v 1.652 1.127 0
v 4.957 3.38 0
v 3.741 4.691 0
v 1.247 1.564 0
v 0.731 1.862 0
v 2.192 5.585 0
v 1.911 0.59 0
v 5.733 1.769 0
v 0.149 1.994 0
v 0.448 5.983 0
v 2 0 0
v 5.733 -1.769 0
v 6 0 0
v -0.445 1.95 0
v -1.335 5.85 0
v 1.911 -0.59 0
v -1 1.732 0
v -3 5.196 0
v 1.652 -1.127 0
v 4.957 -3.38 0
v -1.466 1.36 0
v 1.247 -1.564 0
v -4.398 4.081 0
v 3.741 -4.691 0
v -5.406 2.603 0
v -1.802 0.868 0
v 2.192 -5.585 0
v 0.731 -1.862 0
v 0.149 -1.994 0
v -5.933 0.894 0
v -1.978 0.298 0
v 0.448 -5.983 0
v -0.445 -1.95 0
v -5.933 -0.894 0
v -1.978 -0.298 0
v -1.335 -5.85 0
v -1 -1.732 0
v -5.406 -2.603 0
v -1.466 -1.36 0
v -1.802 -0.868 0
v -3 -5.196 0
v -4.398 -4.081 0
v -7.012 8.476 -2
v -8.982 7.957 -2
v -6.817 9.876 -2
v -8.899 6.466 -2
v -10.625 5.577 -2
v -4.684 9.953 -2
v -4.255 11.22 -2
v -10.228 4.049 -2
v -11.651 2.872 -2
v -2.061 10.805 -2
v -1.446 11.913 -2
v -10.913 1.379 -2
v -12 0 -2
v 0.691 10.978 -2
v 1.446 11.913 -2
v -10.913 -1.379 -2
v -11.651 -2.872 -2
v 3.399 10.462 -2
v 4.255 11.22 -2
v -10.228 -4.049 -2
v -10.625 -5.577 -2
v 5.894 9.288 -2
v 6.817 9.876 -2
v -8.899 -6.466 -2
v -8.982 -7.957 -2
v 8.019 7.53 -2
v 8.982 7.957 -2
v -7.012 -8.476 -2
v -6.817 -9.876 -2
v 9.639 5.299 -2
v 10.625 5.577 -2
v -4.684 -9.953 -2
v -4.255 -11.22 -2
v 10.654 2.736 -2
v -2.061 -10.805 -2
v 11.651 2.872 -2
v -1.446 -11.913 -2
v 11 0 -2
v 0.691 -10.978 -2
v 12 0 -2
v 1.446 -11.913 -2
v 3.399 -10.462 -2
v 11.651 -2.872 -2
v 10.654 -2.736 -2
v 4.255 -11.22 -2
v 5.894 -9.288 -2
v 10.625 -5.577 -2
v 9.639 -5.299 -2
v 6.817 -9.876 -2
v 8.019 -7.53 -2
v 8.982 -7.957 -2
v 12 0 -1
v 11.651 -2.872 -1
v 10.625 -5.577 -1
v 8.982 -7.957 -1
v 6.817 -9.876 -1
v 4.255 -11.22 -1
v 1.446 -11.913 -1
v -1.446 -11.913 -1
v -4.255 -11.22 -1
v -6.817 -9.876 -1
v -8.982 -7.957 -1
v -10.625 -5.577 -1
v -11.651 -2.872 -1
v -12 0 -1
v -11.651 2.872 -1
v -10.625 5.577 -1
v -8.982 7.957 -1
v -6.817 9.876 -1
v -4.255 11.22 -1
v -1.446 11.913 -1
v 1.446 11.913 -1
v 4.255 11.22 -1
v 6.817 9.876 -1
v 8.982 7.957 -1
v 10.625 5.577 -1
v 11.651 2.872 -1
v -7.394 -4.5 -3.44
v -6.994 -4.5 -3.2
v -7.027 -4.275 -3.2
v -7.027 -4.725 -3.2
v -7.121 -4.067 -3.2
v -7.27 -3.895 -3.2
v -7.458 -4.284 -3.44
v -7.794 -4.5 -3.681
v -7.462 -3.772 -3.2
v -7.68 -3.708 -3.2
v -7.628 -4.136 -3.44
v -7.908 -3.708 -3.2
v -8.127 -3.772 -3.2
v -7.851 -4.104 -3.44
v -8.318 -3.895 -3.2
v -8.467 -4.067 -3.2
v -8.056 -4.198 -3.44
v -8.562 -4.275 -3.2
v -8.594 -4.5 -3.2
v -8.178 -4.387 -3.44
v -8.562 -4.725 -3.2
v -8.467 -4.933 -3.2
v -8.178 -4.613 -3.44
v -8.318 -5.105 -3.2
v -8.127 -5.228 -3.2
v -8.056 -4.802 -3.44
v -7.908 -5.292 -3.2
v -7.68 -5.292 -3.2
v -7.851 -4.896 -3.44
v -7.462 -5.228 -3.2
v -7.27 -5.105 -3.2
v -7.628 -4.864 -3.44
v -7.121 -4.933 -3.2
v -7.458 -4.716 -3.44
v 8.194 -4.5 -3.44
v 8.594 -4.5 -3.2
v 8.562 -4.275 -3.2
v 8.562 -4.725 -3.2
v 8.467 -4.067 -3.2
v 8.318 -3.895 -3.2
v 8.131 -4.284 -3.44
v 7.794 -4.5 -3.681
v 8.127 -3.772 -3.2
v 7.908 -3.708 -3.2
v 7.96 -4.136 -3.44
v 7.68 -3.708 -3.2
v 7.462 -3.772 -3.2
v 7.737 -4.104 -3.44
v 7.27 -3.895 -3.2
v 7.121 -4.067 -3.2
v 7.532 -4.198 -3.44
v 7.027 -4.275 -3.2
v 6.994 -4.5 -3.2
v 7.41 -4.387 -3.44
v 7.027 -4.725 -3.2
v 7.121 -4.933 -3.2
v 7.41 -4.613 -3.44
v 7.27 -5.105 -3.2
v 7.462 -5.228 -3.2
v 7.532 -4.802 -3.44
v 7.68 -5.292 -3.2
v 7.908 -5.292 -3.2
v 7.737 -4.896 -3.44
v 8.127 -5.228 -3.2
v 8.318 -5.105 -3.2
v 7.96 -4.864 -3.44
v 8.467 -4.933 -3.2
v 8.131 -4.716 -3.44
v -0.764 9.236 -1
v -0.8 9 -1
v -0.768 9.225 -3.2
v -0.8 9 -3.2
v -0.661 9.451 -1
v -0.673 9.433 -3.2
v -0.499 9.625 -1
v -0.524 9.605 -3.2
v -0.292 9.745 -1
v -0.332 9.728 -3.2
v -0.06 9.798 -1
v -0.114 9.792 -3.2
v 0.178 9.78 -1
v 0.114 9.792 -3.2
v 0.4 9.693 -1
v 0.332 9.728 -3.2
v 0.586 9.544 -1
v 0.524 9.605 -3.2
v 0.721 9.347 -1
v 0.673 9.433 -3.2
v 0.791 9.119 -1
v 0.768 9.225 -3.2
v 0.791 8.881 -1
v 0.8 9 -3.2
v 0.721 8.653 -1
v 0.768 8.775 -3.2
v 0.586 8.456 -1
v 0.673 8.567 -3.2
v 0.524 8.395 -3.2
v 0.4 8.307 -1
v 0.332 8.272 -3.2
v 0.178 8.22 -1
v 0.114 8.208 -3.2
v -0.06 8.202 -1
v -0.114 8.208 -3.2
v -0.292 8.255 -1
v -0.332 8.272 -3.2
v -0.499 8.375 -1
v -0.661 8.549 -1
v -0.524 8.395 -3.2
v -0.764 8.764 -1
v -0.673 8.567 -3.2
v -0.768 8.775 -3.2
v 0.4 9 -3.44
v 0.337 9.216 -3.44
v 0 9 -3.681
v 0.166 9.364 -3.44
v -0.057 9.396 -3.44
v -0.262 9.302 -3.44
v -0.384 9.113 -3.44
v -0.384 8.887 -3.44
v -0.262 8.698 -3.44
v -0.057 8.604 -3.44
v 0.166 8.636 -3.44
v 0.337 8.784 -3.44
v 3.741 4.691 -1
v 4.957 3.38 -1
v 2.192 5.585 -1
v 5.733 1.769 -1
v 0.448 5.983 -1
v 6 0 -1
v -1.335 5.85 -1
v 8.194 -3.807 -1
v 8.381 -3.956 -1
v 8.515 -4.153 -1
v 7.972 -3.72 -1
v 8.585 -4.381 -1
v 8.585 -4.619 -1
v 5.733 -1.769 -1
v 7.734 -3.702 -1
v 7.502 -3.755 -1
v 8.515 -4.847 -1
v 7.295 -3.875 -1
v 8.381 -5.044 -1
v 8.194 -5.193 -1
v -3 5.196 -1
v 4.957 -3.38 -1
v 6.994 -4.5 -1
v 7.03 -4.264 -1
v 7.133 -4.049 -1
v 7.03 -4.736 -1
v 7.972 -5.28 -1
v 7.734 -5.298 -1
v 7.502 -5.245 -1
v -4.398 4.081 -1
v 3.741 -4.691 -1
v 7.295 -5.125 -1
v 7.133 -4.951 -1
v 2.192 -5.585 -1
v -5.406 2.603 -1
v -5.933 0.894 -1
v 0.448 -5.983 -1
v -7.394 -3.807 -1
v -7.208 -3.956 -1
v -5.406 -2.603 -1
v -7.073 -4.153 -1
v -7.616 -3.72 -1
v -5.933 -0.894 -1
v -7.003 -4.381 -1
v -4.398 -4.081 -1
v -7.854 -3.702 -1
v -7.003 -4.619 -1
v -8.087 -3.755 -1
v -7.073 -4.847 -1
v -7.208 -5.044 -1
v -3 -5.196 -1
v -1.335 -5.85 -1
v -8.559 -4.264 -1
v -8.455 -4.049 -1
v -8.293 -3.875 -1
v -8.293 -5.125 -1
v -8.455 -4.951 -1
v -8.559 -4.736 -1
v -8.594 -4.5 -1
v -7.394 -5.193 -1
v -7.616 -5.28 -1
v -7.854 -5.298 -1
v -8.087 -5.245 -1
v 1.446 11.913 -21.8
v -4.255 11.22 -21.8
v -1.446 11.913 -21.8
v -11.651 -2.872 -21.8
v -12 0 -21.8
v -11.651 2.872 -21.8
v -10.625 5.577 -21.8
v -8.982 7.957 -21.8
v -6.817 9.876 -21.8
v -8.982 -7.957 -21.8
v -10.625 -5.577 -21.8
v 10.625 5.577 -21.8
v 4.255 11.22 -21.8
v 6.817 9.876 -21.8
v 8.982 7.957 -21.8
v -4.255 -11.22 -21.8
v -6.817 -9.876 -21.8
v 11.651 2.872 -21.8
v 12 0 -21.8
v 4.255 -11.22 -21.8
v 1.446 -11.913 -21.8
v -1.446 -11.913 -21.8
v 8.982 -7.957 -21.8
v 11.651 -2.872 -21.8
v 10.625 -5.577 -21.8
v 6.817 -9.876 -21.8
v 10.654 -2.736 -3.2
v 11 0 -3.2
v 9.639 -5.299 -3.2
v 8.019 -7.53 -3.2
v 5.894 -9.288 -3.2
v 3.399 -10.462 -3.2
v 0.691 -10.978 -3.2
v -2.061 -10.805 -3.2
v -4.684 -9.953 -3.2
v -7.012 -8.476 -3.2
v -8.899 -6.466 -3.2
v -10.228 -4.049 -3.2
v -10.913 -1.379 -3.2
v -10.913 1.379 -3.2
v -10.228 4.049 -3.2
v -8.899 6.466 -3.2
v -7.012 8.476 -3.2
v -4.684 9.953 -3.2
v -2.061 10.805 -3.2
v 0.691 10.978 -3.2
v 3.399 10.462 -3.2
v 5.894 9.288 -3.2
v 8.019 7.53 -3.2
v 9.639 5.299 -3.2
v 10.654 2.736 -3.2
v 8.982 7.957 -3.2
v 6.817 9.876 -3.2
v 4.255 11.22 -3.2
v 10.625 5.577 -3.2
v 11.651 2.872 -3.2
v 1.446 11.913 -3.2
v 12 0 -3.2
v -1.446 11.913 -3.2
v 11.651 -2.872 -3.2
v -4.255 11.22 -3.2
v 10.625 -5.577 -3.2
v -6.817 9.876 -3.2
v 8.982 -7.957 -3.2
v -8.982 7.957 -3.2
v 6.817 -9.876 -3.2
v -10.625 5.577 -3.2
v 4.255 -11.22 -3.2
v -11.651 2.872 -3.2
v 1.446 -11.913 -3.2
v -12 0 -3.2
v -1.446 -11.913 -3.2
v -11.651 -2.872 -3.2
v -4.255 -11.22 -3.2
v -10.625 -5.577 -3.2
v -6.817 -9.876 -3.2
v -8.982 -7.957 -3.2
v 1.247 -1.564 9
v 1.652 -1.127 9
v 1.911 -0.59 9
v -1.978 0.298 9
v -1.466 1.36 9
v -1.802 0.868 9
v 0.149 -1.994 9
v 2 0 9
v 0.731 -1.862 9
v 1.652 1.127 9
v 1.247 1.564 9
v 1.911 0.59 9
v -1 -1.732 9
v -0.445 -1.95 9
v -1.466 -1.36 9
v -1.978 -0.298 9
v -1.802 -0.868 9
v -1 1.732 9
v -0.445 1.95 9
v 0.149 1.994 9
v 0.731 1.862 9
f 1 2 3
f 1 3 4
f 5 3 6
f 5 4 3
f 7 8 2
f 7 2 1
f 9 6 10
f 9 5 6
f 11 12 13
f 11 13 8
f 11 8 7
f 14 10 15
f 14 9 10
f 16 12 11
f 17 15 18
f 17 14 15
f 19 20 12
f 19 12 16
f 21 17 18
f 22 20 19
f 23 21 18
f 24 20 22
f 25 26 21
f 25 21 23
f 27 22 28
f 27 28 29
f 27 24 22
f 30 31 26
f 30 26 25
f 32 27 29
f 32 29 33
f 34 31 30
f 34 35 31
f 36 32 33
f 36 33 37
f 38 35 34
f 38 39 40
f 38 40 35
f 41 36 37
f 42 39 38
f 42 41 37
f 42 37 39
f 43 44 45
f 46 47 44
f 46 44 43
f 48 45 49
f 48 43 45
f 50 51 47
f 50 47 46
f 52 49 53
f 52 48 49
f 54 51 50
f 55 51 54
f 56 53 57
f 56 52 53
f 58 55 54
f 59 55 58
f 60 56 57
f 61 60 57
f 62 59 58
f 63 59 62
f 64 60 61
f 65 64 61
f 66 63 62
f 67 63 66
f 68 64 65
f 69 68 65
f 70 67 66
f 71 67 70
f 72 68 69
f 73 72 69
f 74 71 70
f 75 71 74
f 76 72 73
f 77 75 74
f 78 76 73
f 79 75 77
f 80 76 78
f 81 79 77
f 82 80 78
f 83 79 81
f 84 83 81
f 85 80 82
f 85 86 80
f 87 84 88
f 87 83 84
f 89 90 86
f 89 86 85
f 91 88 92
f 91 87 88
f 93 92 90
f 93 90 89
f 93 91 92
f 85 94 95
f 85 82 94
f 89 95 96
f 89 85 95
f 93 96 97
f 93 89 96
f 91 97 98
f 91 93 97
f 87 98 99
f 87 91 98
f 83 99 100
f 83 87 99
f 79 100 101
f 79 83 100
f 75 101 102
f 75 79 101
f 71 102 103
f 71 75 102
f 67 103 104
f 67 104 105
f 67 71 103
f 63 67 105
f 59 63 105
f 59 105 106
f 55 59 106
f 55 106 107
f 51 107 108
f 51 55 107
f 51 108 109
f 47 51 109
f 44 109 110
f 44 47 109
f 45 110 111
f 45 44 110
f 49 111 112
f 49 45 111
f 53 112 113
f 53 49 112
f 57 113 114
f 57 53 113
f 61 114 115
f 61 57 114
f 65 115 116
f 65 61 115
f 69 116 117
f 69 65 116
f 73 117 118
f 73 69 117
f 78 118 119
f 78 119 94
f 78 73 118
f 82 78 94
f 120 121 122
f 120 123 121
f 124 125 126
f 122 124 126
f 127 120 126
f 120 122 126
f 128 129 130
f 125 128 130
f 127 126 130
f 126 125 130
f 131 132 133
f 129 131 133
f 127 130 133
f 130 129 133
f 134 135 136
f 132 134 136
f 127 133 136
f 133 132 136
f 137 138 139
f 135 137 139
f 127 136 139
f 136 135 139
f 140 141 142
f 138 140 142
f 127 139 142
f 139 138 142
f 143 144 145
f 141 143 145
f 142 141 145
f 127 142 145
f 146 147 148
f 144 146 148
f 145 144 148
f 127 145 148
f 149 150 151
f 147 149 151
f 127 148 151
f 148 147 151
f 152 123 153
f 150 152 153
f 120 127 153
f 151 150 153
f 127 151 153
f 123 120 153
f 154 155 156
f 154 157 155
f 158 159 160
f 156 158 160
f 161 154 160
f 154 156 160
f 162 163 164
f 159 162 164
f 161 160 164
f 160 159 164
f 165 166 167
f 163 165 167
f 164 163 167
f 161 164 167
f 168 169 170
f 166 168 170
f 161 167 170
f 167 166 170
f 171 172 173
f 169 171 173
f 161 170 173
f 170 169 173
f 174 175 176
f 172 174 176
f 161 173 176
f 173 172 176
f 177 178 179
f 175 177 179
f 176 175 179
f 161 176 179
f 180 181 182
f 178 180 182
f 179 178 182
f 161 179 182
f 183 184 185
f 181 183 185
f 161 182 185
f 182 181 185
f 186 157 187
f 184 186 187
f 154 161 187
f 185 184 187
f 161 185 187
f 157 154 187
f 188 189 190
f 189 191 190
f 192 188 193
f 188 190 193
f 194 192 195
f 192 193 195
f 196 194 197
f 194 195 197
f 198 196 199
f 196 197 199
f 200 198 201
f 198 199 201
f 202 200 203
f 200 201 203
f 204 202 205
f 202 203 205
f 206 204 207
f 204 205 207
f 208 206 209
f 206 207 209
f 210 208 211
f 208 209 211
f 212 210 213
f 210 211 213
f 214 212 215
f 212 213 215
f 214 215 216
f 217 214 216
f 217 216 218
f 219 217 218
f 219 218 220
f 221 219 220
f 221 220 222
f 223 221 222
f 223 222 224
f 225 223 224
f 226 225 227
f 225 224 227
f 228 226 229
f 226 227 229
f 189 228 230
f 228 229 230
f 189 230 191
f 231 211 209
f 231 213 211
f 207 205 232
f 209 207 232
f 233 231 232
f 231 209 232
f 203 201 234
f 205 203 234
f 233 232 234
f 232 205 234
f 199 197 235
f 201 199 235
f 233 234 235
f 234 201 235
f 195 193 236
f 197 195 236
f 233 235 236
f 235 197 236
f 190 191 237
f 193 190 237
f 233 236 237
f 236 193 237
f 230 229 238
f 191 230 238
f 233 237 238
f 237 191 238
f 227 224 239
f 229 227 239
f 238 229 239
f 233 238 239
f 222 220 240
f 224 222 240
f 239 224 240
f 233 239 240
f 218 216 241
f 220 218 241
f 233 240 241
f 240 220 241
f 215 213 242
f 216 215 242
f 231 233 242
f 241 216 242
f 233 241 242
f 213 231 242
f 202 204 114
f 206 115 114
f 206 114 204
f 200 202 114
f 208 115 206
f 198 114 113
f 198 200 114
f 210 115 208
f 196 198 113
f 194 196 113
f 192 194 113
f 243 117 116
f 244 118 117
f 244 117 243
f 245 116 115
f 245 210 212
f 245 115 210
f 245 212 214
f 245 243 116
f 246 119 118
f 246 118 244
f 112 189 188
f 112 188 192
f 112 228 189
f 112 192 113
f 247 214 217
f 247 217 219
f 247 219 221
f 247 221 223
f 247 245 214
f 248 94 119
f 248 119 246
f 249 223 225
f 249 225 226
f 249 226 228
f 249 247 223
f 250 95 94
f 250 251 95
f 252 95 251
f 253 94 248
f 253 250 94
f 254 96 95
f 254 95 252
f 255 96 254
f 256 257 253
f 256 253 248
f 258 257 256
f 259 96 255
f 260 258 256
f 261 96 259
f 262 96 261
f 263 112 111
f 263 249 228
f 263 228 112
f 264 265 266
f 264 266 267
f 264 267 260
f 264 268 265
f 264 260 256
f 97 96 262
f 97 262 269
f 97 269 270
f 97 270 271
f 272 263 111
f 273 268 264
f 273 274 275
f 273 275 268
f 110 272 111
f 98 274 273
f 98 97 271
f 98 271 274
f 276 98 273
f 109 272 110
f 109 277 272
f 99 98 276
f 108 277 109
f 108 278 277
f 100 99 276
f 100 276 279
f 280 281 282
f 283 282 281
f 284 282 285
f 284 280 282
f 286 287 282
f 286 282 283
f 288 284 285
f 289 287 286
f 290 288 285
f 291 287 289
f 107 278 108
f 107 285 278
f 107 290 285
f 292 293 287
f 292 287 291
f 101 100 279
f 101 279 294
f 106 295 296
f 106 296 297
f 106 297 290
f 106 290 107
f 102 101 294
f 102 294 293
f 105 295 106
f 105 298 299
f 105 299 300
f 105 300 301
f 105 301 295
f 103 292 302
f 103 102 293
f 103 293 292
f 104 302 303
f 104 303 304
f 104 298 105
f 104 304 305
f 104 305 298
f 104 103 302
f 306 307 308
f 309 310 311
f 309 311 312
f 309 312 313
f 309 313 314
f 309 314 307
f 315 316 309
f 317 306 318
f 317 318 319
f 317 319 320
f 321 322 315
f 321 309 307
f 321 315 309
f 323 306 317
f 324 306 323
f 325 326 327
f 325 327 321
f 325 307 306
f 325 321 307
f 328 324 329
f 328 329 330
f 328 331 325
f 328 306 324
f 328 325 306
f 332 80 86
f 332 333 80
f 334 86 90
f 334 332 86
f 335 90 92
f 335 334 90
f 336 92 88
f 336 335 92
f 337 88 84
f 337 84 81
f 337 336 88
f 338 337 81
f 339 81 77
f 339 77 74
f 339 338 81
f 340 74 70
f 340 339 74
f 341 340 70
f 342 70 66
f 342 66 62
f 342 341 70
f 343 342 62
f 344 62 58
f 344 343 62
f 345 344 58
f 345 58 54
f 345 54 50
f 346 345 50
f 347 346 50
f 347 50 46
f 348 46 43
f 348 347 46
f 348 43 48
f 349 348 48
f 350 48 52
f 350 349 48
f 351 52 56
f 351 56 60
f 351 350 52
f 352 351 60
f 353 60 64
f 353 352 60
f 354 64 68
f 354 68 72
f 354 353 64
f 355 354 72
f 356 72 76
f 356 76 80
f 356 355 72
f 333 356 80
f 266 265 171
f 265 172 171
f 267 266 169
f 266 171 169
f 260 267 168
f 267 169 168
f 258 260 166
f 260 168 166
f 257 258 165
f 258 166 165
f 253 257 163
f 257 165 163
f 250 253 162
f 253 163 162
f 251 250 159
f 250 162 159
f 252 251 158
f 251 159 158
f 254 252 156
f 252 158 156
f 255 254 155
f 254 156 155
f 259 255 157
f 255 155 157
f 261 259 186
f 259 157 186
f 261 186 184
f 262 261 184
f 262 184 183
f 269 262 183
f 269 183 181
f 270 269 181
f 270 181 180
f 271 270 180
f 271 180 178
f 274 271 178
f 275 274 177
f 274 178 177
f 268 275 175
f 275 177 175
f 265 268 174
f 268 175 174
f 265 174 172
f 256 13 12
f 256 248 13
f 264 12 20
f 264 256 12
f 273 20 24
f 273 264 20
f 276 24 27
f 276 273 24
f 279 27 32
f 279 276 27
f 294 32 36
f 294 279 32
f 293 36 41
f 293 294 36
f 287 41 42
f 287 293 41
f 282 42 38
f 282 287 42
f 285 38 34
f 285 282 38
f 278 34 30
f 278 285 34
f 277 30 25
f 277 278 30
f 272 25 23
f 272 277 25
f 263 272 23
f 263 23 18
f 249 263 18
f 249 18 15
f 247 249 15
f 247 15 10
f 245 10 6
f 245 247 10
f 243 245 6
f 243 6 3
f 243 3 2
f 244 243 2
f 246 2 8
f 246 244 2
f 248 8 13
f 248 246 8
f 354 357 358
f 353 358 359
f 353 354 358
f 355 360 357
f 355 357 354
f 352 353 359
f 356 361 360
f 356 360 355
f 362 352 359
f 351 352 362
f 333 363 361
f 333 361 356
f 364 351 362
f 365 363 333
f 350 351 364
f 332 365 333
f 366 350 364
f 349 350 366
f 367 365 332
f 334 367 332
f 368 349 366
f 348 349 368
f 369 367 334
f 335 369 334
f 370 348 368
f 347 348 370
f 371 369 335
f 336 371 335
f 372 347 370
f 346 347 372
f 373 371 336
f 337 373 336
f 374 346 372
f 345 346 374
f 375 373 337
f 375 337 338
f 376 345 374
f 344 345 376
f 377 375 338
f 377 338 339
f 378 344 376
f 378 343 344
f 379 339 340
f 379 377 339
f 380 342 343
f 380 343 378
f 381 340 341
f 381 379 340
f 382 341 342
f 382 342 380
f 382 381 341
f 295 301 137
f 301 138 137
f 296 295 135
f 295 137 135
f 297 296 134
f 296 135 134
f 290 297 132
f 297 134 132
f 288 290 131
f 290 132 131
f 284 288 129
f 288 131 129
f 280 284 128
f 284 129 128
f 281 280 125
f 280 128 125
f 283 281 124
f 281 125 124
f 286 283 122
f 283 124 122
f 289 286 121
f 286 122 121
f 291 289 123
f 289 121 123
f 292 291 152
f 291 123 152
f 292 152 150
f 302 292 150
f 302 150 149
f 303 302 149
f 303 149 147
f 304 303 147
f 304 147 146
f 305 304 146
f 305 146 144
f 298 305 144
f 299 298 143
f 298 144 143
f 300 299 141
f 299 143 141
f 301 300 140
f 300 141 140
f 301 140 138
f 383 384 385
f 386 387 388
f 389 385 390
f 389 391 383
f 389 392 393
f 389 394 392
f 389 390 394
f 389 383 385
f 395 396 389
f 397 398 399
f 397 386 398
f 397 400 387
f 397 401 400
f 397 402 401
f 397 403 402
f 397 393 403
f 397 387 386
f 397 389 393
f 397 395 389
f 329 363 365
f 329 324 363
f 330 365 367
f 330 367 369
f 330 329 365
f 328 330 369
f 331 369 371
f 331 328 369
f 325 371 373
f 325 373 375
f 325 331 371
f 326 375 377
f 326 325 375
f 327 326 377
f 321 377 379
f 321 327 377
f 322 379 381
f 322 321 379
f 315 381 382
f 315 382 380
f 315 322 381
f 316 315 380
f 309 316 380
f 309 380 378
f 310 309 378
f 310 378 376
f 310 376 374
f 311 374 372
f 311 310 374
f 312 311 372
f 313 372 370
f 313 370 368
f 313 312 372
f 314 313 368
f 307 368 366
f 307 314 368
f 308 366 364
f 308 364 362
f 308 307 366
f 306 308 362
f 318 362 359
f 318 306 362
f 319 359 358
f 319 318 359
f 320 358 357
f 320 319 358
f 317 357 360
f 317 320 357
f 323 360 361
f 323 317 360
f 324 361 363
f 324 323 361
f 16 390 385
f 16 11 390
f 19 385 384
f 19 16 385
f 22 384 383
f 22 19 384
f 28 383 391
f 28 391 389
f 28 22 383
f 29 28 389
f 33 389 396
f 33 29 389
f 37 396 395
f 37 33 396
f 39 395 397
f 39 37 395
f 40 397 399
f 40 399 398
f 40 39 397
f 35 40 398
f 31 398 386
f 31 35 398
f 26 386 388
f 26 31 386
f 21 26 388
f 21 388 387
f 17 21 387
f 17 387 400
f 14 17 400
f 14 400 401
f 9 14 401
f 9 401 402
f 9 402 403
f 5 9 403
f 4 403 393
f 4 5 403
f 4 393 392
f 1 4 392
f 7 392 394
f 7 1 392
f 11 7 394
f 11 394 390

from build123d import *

# Parameters (mm, degrees)
TROU_TARAUD_M2X0_41_D     = 1.6
TROU_TARAUD_M2X0_41_DEPTH = 3.2
TROU_TARAUD_M2X0_41_TIP   = 0.480688495


with BuildPart() as part:
    # Esquisse1 → Révolution1 (revolve)
    with BuildSketch(Plane(origin=(0, 0, 0), x_dir=(0, 0, -1), z_dir=(1, 0, 0))):
        Polygon((-9, 0), (-9, 2), (0, 2), (0, 6), (1, 6), (1, 12), (2, 12), (2, 11), (3.2, 11), (3.2, 12), (21.8, 12), (21.8, 0), align=None)
    revolve(axis=Axis((0, 0, 27.833895637), (0, 0, -1)))

    # Trou taraudé M2x0.41
    with Locations(Plane.XY):
        with Locations((-7.794228634, -4.5), (7.794228634, -4.5), (0, 9)):
            Hole(TROU_TARAUD_M2X0_41_D / 2, depth=TROU_TARAUD_M2X0_41_DEPTH)
            with Locations((0, 0, -(TROU_TARAUD_M2X0_41_DEPTH + TROU_TARAUD_M2X0_41_TIP / 2))):  # 118° drill point
                Cone(0, TROU_TARAUD_M2X0_41_D / 2, TROU_TARAUD_M2X0_41_TIP, mode=Mode.SUBTRACT)


solid = part.part
